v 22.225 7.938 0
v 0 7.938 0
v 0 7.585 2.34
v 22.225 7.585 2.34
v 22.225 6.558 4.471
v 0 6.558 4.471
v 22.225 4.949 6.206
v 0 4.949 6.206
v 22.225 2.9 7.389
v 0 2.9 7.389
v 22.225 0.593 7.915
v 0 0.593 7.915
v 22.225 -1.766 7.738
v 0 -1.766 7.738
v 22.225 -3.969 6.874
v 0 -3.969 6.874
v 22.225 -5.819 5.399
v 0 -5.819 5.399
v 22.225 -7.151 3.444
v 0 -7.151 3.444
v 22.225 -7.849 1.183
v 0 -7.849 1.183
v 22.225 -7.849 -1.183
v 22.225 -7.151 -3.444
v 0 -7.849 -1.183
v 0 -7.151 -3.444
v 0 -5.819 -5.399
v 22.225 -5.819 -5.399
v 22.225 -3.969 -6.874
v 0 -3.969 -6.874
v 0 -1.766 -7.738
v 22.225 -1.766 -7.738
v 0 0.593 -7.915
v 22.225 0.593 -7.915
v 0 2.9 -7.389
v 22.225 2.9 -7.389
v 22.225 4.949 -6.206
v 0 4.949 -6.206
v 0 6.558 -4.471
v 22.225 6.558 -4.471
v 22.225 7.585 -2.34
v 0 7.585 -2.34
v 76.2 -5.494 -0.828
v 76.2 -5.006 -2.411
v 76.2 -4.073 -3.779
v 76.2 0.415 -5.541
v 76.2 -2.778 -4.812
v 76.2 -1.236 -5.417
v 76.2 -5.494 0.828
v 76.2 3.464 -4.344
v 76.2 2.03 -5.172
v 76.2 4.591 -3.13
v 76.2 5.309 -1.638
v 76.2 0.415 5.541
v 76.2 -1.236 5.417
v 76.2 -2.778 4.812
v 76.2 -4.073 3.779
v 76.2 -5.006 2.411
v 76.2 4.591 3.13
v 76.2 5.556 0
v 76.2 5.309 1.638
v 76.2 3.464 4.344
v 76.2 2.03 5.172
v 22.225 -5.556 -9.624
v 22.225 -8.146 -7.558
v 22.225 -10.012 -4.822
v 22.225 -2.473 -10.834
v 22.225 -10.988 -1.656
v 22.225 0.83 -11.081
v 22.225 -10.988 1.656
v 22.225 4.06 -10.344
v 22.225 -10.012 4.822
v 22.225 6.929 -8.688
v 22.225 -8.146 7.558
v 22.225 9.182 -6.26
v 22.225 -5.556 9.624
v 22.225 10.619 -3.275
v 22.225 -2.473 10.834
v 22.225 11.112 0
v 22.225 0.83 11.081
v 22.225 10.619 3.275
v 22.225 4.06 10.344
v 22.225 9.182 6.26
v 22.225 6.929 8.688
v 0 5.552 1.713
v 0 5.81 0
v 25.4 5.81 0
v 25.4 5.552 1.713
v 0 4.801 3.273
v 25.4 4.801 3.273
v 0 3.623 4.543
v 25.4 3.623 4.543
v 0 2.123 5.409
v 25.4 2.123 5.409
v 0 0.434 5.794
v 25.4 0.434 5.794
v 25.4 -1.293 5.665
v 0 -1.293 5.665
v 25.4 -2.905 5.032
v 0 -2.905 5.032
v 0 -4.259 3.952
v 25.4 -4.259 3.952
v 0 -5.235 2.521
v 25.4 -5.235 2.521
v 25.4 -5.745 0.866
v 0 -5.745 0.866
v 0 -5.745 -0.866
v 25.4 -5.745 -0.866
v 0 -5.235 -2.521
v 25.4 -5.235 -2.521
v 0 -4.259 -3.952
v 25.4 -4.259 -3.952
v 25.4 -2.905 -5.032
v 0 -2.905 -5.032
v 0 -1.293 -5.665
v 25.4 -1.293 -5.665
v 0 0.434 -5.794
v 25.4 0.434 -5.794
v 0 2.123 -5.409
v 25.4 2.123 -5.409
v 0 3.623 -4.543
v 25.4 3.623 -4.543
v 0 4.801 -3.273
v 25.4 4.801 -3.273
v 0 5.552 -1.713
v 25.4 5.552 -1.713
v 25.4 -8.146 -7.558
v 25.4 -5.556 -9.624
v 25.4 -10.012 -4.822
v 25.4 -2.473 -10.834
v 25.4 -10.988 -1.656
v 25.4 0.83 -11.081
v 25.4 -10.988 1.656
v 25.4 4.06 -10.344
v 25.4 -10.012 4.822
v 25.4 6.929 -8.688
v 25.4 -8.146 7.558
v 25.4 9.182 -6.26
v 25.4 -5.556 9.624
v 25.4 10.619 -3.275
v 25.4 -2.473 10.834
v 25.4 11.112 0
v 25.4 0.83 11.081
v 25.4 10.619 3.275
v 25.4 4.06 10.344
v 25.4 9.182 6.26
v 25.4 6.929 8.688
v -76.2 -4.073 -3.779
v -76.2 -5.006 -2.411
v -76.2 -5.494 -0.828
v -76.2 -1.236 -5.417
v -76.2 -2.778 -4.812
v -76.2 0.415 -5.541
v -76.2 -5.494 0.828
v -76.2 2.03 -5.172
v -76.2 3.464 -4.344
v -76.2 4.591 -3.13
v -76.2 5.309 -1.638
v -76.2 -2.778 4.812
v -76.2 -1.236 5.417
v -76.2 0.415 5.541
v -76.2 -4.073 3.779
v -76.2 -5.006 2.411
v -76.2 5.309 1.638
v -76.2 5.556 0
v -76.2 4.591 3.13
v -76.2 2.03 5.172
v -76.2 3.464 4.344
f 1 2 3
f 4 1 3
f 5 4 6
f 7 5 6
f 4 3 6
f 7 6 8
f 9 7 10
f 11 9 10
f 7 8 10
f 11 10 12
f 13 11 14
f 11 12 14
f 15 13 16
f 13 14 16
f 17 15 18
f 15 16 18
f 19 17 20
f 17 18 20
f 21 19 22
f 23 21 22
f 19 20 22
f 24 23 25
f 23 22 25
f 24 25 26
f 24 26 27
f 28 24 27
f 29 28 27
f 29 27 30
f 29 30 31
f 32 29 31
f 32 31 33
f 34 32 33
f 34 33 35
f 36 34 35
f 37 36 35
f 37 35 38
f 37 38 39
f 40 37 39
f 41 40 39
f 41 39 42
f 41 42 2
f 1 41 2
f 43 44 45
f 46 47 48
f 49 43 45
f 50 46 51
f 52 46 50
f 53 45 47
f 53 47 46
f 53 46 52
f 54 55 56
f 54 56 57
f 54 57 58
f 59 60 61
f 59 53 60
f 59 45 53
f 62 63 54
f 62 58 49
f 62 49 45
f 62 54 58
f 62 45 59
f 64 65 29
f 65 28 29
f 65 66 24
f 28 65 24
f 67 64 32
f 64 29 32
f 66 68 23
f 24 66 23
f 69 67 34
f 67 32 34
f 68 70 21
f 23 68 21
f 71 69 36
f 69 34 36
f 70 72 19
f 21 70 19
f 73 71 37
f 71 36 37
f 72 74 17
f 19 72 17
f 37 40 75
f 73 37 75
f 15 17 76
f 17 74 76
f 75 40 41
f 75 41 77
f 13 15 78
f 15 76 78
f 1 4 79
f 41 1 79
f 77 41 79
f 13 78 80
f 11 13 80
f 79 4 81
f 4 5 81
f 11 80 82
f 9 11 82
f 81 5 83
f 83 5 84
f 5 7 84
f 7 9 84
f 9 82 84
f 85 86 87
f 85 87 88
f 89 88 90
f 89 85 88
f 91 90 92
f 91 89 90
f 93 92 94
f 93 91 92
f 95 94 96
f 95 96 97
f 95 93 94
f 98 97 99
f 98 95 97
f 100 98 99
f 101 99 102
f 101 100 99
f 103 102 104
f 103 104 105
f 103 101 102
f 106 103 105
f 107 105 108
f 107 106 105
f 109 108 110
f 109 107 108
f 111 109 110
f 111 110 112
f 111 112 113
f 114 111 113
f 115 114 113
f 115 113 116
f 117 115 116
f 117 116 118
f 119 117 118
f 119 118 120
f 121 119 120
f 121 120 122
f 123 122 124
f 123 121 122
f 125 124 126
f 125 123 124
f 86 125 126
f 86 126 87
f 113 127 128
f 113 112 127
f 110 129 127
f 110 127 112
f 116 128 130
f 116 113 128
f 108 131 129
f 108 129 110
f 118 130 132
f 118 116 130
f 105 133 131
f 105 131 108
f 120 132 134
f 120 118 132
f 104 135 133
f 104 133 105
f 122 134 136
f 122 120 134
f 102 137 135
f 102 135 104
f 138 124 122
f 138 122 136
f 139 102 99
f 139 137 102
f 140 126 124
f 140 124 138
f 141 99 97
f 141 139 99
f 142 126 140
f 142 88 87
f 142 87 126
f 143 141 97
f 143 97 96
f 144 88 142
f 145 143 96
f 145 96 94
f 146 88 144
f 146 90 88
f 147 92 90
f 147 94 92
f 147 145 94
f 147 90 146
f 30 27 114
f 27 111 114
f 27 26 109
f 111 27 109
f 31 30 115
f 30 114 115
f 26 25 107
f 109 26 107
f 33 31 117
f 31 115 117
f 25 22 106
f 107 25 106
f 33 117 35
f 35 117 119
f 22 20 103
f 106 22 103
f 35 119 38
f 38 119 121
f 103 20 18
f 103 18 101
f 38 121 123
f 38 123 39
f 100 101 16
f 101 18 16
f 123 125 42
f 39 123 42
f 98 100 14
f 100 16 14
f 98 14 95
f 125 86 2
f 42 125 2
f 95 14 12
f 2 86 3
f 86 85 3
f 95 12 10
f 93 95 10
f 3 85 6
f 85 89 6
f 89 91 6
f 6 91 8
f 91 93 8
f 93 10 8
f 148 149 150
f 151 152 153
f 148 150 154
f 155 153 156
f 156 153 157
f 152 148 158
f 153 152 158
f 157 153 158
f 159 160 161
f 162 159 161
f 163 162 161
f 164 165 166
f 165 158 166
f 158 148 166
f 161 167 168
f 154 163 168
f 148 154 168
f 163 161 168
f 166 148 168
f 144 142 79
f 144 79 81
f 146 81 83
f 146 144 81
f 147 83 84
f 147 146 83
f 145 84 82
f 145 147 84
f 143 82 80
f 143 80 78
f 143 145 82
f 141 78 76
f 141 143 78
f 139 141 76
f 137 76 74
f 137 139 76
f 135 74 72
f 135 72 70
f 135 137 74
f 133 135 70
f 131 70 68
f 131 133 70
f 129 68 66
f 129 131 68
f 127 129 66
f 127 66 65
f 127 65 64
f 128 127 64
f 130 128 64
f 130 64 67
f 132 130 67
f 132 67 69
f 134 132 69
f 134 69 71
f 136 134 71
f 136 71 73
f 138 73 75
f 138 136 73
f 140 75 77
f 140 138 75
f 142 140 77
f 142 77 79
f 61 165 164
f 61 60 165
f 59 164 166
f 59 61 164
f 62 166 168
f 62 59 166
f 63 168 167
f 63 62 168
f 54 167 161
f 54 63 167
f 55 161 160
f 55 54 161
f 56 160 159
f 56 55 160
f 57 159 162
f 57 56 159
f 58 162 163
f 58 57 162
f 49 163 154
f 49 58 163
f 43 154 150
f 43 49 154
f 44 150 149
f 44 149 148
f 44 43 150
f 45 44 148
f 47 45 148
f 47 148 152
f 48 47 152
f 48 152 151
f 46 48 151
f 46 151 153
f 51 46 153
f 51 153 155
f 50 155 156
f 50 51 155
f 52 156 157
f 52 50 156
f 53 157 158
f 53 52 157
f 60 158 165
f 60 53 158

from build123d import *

# Parameters (mm, degrees)
F0_R     = 5.55625
F1_DEPTH = 76.2
F0_R_2   = 7.9375
F0_R_3   = 5.81025
F2_DEPTH = 25.4
F3_R     = 11.1125
F3_R_2   = 7.9375
F4_DEPTH = 3.175


with BuildPart() as f1:
    # F0 (on Right) → F1 (new body, symmetric)
    with BuildSketch(Plane.YZ):
        Circle(F0_R)
    extrude(amount=F1_DEPTH, both=True)


with BuildPart() as f2:
    # F0 (on Right) → F2 (new body)
    with BuildSketch(Plane.YZ):
        Circle(F0_R_2)
        Circle(F0_R_3, mode=Mode.SUBTRACT)
    extrude(amount=F2_DEPTH)

    # F3 (on face) → F4 (join)
    with BuildSketch(Plane.YZ.offset(25.4)):
        Circle(F3_R)
        Circle(F3_R_2, mode=Mode.SUBTRACT)
    extrude(amount=-F4_DEPTH)


solid = Compound([f1.part, f2.part])
